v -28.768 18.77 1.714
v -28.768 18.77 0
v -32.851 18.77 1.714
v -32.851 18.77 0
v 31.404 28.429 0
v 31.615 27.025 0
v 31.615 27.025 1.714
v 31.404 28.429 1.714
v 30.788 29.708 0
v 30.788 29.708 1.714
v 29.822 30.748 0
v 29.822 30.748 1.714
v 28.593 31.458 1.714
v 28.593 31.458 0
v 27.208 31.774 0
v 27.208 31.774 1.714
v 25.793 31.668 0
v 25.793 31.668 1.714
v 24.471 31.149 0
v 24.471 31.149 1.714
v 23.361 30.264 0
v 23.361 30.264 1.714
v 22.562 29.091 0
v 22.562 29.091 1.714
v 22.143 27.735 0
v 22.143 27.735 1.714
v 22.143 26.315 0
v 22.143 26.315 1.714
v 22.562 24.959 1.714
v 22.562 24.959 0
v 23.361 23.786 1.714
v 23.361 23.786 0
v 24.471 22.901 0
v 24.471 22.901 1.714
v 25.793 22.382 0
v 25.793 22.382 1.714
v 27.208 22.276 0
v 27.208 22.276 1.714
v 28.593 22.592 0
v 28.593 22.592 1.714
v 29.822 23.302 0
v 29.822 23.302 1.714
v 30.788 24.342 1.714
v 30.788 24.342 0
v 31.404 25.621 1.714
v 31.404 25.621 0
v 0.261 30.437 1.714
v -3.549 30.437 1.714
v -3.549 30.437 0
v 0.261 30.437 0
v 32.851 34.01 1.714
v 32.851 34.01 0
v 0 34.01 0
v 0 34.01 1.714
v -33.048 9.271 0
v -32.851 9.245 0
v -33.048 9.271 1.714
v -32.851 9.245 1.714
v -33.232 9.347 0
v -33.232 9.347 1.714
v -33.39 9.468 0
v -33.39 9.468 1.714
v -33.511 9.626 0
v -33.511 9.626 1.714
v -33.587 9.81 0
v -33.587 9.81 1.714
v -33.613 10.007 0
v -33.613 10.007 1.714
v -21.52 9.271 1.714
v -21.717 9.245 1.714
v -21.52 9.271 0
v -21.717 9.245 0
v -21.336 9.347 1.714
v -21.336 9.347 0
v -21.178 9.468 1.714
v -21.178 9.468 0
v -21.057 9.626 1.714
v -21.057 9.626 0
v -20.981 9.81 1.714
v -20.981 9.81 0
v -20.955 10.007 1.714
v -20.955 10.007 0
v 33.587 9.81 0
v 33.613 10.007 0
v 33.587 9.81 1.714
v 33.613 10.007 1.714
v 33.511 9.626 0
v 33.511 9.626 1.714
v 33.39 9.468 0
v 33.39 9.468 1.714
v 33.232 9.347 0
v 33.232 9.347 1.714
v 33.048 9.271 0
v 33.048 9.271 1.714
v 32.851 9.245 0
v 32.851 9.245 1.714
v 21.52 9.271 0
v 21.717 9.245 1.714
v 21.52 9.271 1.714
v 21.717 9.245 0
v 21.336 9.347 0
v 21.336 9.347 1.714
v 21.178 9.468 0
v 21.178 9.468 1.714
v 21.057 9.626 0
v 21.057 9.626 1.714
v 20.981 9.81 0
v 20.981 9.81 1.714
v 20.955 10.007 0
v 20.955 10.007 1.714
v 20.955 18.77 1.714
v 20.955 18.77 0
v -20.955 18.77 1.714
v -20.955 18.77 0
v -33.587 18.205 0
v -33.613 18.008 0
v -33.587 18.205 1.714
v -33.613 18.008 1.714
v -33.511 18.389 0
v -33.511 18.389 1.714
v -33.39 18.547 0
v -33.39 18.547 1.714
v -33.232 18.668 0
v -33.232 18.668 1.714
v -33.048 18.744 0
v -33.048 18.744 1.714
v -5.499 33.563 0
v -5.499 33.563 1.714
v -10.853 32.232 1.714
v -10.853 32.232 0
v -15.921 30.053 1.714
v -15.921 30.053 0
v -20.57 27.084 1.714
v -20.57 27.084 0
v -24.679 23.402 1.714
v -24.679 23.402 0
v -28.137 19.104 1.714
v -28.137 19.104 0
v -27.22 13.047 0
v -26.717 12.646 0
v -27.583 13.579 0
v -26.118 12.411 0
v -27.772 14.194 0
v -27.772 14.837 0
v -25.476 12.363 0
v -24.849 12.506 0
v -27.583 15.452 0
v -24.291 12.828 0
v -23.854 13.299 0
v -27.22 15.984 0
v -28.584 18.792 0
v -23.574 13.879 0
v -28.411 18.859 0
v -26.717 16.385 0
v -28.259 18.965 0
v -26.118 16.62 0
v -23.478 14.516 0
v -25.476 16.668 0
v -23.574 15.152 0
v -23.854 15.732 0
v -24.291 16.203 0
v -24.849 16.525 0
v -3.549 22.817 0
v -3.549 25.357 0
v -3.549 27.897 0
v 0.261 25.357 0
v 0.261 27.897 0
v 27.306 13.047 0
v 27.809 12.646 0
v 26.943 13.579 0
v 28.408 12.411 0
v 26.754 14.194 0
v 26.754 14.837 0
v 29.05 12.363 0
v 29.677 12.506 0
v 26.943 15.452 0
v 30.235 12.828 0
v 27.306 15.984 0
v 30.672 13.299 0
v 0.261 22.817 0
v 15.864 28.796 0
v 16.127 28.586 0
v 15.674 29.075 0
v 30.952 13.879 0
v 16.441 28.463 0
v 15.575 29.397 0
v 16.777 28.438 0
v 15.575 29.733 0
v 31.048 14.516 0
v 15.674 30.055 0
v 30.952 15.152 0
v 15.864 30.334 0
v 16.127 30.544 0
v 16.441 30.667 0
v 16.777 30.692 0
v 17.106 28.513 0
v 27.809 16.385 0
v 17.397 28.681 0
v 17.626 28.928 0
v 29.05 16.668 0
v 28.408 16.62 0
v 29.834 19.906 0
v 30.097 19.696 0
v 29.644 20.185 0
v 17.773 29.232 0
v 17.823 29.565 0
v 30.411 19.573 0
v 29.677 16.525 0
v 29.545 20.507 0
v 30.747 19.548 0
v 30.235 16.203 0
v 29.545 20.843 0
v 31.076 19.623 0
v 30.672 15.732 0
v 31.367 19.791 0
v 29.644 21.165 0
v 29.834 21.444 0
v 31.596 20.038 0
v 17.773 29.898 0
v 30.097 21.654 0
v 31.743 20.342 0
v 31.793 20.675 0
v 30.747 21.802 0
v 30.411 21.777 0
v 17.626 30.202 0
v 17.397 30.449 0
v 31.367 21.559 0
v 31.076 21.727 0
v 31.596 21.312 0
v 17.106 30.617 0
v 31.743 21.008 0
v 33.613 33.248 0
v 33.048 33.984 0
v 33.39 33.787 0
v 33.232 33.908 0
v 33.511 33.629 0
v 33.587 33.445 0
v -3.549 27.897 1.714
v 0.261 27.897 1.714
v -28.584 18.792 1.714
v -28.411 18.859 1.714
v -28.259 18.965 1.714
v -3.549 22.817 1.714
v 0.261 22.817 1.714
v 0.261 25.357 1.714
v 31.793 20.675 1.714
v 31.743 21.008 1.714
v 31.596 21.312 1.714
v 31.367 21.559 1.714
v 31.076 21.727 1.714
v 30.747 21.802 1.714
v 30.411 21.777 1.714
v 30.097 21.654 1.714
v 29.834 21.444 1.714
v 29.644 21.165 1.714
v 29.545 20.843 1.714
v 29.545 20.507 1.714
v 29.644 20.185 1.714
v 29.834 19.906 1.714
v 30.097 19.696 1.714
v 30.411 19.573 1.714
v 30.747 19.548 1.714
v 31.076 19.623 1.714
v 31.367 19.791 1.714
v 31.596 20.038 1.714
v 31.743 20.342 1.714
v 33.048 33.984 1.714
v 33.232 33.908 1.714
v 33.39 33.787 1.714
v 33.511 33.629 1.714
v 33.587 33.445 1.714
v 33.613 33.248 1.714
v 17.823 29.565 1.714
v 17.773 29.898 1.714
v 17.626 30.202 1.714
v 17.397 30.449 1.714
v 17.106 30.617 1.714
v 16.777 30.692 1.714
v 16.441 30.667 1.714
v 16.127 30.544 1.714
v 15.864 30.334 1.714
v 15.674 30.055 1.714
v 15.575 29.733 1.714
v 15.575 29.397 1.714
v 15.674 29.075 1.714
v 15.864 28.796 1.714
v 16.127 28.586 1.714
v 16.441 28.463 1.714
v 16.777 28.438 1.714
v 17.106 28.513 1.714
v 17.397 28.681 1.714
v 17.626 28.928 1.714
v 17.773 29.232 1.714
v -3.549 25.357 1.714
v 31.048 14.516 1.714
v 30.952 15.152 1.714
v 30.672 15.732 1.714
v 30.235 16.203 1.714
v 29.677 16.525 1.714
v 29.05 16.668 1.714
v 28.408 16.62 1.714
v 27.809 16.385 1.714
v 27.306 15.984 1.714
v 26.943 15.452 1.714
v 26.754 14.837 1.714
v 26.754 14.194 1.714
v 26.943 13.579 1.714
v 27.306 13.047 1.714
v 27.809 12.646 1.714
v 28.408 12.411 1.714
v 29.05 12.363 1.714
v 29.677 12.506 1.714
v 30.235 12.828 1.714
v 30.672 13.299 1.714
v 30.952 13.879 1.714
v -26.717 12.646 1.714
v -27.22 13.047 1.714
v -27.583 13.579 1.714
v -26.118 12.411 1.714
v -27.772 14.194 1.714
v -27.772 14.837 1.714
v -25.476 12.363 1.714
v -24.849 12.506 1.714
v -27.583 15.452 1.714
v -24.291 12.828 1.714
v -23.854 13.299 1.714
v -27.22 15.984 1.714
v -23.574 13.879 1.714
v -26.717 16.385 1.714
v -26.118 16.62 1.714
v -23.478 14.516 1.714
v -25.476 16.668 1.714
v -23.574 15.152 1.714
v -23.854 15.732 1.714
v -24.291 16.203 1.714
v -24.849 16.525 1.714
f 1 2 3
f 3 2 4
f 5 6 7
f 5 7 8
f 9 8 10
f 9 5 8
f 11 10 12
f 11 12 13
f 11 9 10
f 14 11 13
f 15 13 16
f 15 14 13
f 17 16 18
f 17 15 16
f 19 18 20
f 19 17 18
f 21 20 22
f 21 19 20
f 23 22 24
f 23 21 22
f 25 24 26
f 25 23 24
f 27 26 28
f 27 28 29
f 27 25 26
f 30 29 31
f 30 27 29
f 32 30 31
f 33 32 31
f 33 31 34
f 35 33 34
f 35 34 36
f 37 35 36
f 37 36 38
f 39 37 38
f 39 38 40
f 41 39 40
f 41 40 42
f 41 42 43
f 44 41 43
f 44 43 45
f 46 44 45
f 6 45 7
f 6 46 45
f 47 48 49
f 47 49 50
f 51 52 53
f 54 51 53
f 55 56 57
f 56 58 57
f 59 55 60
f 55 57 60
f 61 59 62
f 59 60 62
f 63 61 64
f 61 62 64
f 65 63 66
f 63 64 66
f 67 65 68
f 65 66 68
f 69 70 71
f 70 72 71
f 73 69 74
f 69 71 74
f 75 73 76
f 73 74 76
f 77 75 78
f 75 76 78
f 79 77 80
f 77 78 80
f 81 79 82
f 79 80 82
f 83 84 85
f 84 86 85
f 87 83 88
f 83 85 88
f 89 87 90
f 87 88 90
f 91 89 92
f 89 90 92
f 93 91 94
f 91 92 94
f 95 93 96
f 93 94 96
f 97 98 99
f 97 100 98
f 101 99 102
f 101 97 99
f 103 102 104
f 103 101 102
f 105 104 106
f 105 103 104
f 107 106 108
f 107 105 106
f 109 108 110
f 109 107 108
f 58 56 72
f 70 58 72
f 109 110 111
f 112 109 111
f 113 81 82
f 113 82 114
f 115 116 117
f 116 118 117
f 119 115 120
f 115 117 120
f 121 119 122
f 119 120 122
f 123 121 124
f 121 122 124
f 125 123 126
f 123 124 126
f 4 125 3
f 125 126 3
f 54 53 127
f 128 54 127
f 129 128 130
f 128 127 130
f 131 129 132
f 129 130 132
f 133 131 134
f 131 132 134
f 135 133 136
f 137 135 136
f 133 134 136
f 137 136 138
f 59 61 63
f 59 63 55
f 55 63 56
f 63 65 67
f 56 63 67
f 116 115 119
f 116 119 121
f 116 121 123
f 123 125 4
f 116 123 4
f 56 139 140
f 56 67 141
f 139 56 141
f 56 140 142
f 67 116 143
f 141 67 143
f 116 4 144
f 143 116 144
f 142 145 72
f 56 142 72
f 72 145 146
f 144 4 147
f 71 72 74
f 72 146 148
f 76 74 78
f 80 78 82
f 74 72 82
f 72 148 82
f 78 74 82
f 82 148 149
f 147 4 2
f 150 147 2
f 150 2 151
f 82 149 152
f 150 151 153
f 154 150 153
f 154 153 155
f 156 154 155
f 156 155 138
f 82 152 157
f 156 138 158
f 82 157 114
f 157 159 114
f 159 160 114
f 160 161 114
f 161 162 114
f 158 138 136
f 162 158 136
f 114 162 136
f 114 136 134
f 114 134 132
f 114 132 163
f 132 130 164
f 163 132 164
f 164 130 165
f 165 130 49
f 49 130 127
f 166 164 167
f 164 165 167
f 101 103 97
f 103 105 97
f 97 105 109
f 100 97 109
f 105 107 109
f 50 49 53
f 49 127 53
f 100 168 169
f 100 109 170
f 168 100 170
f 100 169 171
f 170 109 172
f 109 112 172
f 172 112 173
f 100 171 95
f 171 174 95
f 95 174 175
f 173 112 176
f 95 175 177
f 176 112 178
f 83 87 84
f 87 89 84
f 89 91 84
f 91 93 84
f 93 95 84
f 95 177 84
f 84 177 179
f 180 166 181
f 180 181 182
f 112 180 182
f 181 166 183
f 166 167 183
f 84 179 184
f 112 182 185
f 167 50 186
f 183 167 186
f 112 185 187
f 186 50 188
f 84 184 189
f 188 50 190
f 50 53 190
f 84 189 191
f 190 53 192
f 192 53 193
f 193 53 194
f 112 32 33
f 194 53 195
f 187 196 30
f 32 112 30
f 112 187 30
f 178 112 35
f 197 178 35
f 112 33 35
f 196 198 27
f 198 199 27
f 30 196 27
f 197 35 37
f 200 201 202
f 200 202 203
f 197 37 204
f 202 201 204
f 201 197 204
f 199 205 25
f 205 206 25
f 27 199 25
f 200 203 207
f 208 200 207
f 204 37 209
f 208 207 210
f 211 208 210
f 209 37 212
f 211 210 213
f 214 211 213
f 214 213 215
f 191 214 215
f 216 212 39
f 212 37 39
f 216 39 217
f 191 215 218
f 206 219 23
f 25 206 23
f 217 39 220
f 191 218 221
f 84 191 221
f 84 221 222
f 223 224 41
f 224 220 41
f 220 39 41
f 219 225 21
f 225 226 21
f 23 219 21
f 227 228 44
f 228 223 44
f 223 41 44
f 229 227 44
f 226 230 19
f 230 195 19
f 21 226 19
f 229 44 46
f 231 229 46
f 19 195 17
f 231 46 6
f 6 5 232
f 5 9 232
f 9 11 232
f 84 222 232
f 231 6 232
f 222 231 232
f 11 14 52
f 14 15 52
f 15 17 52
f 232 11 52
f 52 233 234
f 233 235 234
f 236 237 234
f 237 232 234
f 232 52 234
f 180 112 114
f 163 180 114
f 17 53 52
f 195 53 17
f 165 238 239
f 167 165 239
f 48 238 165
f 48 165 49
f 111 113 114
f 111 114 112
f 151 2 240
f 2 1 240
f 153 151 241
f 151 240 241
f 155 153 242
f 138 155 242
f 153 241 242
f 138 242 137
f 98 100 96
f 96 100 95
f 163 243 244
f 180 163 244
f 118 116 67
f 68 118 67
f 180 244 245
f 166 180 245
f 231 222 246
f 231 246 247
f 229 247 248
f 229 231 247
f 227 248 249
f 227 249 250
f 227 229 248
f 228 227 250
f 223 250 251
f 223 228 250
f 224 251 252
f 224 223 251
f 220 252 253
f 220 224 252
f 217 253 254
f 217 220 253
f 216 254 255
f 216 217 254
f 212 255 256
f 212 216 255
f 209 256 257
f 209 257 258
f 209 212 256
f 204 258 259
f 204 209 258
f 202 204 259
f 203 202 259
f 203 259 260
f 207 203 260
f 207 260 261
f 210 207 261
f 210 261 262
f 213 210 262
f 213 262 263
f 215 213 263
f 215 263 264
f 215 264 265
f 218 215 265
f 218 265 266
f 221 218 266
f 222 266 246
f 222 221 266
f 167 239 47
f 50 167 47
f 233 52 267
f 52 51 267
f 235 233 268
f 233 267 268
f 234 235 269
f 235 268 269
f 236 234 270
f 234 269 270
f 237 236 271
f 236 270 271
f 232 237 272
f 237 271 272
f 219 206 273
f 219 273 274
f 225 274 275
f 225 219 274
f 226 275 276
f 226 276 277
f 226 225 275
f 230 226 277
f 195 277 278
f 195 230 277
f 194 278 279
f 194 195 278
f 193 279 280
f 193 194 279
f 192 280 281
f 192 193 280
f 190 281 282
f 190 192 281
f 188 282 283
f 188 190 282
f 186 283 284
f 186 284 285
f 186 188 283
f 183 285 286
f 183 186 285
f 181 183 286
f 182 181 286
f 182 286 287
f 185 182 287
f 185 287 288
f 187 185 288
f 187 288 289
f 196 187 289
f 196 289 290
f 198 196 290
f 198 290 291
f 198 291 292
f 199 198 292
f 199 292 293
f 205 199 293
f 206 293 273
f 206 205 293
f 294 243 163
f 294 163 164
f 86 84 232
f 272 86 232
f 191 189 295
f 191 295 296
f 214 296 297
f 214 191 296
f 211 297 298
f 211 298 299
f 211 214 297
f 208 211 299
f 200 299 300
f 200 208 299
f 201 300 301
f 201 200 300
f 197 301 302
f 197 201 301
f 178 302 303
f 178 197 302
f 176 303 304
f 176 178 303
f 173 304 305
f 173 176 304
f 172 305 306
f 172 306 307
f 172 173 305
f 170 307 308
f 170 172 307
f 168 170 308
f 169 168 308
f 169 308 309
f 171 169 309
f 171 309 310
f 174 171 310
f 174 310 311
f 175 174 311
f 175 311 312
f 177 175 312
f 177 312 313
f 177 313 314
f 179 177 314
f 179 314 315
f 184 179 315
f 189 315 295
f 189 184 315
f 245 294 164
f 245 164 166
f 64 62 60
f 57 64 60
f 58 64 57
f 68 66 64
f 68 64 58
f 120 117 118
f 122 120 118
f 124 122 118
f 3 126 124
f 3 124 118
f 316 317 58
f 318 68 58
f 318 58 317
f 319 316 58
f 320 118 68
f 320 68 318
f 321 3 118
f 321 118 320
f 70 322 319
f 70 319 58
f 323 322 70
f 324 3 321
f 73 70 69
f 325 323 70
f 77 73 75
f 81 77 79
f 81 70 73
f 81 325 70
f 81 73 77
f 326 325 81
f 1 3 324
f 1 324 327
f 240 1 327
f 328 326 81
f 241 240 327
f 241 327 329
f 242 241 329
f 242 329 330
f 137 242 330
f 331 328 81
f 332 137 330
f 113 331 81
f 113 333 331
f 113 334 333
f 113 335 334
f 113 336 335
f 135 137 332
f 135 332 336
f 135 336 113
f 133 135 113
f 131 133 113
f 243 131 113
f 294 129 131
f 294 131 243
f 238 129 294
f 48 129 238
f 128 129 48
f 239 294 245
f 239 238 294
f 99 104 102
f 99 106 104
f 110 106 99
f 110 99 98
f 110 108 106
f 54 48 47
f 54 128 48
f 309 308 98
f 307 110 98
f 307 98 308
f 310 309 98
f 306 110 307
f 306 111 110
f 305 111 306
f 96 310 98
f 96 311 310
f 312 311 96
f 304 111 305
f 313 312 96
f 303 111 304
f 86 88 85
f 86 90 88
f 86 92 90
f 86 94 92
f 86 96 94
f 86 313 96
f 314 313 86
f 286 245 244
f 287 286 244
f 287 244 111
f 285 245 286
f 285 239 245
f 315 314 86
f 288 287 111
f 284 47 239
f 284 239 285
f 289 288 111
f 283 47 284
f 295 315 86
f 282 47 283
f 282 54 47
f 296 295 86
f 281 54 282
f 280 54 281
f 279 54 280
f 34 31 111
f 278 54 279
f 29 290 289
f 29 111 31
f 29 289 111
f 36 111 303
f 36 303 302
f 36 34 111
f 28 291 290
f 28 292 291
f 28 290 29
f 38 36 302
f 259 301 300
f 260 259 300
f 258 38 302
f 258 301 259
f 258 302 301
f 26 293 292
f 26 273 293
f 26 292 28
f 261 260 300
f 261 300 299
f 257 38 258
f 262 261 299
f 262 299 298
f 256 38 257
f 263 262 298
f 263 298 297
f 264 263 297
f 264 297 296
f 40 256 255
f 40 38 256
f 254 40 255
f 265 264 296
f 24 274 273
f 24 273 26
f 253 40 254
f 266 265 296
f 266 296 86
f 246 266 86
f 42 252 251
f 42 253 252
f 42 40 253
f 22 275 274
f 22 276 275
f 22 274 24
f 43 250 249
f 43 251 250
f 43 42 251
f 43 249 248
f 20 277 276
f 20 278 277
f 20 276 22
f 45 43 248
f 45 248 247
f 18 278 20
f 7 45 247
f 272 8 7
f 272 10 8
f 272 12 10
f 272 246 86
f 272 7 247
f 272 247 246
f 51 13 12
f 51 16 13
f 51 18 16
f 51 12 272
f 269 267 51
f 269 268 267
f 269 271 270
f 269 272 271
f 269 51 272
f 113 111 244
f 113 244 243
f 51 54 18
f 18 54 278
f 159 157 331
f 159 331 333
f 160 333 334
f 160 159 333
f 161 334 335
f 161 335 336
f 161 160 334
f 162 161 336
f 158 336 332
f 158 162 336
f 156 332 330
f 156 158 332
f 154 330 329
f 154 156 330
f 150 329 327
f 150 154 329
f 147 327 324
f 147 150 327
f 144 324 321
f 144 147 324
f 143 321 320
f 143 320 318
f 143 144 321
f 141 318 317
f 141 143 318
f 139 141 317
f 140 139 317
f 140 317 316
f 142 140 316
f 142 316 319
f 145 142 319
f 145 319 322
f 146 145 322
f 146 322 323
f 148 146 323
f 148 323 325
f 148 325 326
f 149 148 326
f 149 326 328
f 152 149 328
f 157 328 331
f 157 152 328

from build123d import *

# Parameters (mm, degrees)
SKETCH1_R           = 4.7625
SKETCH1_R_2         = 2.159
SKETCH1_R_3         = 1.1303
BOSS_EXTRUDE1_DEPTH = 1.7145
SKETCH2_W           = 3.81
SKETCH2_H           = 2.54
CUT_EXTRUDE1_DEPTH  = 1.7145
SKETCH3_W           = 41.91
SKETCH3_H           = 9.525
CUT_EXTRUDE2_DEPTH  = 1.7145
FILLET1_R           = 0.762


with BuildPart() as part:
    # Sketch1 → Boss-Extrude1 (new body)
    with BuildSketch(Plane.XY):
        with BuildLine():
            Line((-33.613, 9.245), (33.613, 9.245))
            Line((33.613, 9.245), (33.613, 34.01))
            Line((33.613, 34.01), (0, 34.01))
            ThreePointArc((0, 34.01), (-16.098329106, 29.958703243), (-28.361368091, 18.77))
            Line((-28.361368091, 18.77), (-33.613, 18.77))
            Line((-33.613, 18.77), (-33.613, 9.245))
        make_face()
        with Locations((26.852588835, 27.025)):
            Circle(SKETCH1_R, mode=Mode.SUBTRACT)
        with Locations((-25.6374, 14.5155)):
            Circle(SKETCH1_R_2, mode=Mode.SUBTRACT)
        with Locations((28.8886, 14.5155)):
            Circle(SKETCH1_R_2, mode=Mode.SUBTRACT)
        with Locations((30.662588835, 20.675)):
            Circle(SKETCH1_R_3, mode=Mode.SUBTRACT)
        with Locations((16.692588835, 29.565)):
            Circle(SKETCH1_R_3, mode=Mode.SUBTRACT)
    extrude(amount=BOSS_EXTRUDE1_DEPTH)

    # Sketch2 → Cut-Extrude1 (cut)
    with BuildSketch(Plane.XY.offset(1.7145)):
        with Locations((-1.644140797, 29.166672544)):
            Rectangle(SKETCH2_W, SKETCH2_H)
        with Locations((-1.644140797, 24.086672544)):
            Rectangle(SKETCH2_W, SKETCH2_H)
    extrude(amount=-CUT_EXTRUDE1_DEPTH, mode=Mode.SUBTRACT)

    # Sketch3 → Cut-Extrude2 (cut)
    with BuildSketch(Plane.XY.offset(1.7145)):
        with Locations((0, 14.0075)):
            Rectangle(SKETCH3_W, SKETCH3_H)
    extrude(amount=-CUT_EXTRUDE2_DEPTH, mode=Mode.SUBTRACT)

    # Fillet1
    fillet1_edges = [part.edges().sort_by_distance(p)[0] for p in [
        (-28.361368091, 18.77, 0.85725),
        (33.613, 34.01, 0.85725),
        (33.613, 9.245, 0.85725),
        (-33.613, 9.245, 0.85725),
        (-33.613, 18.77, 0.85725),
        (-20.955, 9.245, 0.85725),
        (20.955, 9.245, 0.85725),
    ]]
    fillet(fillet1_edges, radius=FILLET1_R)


solid = part.part
